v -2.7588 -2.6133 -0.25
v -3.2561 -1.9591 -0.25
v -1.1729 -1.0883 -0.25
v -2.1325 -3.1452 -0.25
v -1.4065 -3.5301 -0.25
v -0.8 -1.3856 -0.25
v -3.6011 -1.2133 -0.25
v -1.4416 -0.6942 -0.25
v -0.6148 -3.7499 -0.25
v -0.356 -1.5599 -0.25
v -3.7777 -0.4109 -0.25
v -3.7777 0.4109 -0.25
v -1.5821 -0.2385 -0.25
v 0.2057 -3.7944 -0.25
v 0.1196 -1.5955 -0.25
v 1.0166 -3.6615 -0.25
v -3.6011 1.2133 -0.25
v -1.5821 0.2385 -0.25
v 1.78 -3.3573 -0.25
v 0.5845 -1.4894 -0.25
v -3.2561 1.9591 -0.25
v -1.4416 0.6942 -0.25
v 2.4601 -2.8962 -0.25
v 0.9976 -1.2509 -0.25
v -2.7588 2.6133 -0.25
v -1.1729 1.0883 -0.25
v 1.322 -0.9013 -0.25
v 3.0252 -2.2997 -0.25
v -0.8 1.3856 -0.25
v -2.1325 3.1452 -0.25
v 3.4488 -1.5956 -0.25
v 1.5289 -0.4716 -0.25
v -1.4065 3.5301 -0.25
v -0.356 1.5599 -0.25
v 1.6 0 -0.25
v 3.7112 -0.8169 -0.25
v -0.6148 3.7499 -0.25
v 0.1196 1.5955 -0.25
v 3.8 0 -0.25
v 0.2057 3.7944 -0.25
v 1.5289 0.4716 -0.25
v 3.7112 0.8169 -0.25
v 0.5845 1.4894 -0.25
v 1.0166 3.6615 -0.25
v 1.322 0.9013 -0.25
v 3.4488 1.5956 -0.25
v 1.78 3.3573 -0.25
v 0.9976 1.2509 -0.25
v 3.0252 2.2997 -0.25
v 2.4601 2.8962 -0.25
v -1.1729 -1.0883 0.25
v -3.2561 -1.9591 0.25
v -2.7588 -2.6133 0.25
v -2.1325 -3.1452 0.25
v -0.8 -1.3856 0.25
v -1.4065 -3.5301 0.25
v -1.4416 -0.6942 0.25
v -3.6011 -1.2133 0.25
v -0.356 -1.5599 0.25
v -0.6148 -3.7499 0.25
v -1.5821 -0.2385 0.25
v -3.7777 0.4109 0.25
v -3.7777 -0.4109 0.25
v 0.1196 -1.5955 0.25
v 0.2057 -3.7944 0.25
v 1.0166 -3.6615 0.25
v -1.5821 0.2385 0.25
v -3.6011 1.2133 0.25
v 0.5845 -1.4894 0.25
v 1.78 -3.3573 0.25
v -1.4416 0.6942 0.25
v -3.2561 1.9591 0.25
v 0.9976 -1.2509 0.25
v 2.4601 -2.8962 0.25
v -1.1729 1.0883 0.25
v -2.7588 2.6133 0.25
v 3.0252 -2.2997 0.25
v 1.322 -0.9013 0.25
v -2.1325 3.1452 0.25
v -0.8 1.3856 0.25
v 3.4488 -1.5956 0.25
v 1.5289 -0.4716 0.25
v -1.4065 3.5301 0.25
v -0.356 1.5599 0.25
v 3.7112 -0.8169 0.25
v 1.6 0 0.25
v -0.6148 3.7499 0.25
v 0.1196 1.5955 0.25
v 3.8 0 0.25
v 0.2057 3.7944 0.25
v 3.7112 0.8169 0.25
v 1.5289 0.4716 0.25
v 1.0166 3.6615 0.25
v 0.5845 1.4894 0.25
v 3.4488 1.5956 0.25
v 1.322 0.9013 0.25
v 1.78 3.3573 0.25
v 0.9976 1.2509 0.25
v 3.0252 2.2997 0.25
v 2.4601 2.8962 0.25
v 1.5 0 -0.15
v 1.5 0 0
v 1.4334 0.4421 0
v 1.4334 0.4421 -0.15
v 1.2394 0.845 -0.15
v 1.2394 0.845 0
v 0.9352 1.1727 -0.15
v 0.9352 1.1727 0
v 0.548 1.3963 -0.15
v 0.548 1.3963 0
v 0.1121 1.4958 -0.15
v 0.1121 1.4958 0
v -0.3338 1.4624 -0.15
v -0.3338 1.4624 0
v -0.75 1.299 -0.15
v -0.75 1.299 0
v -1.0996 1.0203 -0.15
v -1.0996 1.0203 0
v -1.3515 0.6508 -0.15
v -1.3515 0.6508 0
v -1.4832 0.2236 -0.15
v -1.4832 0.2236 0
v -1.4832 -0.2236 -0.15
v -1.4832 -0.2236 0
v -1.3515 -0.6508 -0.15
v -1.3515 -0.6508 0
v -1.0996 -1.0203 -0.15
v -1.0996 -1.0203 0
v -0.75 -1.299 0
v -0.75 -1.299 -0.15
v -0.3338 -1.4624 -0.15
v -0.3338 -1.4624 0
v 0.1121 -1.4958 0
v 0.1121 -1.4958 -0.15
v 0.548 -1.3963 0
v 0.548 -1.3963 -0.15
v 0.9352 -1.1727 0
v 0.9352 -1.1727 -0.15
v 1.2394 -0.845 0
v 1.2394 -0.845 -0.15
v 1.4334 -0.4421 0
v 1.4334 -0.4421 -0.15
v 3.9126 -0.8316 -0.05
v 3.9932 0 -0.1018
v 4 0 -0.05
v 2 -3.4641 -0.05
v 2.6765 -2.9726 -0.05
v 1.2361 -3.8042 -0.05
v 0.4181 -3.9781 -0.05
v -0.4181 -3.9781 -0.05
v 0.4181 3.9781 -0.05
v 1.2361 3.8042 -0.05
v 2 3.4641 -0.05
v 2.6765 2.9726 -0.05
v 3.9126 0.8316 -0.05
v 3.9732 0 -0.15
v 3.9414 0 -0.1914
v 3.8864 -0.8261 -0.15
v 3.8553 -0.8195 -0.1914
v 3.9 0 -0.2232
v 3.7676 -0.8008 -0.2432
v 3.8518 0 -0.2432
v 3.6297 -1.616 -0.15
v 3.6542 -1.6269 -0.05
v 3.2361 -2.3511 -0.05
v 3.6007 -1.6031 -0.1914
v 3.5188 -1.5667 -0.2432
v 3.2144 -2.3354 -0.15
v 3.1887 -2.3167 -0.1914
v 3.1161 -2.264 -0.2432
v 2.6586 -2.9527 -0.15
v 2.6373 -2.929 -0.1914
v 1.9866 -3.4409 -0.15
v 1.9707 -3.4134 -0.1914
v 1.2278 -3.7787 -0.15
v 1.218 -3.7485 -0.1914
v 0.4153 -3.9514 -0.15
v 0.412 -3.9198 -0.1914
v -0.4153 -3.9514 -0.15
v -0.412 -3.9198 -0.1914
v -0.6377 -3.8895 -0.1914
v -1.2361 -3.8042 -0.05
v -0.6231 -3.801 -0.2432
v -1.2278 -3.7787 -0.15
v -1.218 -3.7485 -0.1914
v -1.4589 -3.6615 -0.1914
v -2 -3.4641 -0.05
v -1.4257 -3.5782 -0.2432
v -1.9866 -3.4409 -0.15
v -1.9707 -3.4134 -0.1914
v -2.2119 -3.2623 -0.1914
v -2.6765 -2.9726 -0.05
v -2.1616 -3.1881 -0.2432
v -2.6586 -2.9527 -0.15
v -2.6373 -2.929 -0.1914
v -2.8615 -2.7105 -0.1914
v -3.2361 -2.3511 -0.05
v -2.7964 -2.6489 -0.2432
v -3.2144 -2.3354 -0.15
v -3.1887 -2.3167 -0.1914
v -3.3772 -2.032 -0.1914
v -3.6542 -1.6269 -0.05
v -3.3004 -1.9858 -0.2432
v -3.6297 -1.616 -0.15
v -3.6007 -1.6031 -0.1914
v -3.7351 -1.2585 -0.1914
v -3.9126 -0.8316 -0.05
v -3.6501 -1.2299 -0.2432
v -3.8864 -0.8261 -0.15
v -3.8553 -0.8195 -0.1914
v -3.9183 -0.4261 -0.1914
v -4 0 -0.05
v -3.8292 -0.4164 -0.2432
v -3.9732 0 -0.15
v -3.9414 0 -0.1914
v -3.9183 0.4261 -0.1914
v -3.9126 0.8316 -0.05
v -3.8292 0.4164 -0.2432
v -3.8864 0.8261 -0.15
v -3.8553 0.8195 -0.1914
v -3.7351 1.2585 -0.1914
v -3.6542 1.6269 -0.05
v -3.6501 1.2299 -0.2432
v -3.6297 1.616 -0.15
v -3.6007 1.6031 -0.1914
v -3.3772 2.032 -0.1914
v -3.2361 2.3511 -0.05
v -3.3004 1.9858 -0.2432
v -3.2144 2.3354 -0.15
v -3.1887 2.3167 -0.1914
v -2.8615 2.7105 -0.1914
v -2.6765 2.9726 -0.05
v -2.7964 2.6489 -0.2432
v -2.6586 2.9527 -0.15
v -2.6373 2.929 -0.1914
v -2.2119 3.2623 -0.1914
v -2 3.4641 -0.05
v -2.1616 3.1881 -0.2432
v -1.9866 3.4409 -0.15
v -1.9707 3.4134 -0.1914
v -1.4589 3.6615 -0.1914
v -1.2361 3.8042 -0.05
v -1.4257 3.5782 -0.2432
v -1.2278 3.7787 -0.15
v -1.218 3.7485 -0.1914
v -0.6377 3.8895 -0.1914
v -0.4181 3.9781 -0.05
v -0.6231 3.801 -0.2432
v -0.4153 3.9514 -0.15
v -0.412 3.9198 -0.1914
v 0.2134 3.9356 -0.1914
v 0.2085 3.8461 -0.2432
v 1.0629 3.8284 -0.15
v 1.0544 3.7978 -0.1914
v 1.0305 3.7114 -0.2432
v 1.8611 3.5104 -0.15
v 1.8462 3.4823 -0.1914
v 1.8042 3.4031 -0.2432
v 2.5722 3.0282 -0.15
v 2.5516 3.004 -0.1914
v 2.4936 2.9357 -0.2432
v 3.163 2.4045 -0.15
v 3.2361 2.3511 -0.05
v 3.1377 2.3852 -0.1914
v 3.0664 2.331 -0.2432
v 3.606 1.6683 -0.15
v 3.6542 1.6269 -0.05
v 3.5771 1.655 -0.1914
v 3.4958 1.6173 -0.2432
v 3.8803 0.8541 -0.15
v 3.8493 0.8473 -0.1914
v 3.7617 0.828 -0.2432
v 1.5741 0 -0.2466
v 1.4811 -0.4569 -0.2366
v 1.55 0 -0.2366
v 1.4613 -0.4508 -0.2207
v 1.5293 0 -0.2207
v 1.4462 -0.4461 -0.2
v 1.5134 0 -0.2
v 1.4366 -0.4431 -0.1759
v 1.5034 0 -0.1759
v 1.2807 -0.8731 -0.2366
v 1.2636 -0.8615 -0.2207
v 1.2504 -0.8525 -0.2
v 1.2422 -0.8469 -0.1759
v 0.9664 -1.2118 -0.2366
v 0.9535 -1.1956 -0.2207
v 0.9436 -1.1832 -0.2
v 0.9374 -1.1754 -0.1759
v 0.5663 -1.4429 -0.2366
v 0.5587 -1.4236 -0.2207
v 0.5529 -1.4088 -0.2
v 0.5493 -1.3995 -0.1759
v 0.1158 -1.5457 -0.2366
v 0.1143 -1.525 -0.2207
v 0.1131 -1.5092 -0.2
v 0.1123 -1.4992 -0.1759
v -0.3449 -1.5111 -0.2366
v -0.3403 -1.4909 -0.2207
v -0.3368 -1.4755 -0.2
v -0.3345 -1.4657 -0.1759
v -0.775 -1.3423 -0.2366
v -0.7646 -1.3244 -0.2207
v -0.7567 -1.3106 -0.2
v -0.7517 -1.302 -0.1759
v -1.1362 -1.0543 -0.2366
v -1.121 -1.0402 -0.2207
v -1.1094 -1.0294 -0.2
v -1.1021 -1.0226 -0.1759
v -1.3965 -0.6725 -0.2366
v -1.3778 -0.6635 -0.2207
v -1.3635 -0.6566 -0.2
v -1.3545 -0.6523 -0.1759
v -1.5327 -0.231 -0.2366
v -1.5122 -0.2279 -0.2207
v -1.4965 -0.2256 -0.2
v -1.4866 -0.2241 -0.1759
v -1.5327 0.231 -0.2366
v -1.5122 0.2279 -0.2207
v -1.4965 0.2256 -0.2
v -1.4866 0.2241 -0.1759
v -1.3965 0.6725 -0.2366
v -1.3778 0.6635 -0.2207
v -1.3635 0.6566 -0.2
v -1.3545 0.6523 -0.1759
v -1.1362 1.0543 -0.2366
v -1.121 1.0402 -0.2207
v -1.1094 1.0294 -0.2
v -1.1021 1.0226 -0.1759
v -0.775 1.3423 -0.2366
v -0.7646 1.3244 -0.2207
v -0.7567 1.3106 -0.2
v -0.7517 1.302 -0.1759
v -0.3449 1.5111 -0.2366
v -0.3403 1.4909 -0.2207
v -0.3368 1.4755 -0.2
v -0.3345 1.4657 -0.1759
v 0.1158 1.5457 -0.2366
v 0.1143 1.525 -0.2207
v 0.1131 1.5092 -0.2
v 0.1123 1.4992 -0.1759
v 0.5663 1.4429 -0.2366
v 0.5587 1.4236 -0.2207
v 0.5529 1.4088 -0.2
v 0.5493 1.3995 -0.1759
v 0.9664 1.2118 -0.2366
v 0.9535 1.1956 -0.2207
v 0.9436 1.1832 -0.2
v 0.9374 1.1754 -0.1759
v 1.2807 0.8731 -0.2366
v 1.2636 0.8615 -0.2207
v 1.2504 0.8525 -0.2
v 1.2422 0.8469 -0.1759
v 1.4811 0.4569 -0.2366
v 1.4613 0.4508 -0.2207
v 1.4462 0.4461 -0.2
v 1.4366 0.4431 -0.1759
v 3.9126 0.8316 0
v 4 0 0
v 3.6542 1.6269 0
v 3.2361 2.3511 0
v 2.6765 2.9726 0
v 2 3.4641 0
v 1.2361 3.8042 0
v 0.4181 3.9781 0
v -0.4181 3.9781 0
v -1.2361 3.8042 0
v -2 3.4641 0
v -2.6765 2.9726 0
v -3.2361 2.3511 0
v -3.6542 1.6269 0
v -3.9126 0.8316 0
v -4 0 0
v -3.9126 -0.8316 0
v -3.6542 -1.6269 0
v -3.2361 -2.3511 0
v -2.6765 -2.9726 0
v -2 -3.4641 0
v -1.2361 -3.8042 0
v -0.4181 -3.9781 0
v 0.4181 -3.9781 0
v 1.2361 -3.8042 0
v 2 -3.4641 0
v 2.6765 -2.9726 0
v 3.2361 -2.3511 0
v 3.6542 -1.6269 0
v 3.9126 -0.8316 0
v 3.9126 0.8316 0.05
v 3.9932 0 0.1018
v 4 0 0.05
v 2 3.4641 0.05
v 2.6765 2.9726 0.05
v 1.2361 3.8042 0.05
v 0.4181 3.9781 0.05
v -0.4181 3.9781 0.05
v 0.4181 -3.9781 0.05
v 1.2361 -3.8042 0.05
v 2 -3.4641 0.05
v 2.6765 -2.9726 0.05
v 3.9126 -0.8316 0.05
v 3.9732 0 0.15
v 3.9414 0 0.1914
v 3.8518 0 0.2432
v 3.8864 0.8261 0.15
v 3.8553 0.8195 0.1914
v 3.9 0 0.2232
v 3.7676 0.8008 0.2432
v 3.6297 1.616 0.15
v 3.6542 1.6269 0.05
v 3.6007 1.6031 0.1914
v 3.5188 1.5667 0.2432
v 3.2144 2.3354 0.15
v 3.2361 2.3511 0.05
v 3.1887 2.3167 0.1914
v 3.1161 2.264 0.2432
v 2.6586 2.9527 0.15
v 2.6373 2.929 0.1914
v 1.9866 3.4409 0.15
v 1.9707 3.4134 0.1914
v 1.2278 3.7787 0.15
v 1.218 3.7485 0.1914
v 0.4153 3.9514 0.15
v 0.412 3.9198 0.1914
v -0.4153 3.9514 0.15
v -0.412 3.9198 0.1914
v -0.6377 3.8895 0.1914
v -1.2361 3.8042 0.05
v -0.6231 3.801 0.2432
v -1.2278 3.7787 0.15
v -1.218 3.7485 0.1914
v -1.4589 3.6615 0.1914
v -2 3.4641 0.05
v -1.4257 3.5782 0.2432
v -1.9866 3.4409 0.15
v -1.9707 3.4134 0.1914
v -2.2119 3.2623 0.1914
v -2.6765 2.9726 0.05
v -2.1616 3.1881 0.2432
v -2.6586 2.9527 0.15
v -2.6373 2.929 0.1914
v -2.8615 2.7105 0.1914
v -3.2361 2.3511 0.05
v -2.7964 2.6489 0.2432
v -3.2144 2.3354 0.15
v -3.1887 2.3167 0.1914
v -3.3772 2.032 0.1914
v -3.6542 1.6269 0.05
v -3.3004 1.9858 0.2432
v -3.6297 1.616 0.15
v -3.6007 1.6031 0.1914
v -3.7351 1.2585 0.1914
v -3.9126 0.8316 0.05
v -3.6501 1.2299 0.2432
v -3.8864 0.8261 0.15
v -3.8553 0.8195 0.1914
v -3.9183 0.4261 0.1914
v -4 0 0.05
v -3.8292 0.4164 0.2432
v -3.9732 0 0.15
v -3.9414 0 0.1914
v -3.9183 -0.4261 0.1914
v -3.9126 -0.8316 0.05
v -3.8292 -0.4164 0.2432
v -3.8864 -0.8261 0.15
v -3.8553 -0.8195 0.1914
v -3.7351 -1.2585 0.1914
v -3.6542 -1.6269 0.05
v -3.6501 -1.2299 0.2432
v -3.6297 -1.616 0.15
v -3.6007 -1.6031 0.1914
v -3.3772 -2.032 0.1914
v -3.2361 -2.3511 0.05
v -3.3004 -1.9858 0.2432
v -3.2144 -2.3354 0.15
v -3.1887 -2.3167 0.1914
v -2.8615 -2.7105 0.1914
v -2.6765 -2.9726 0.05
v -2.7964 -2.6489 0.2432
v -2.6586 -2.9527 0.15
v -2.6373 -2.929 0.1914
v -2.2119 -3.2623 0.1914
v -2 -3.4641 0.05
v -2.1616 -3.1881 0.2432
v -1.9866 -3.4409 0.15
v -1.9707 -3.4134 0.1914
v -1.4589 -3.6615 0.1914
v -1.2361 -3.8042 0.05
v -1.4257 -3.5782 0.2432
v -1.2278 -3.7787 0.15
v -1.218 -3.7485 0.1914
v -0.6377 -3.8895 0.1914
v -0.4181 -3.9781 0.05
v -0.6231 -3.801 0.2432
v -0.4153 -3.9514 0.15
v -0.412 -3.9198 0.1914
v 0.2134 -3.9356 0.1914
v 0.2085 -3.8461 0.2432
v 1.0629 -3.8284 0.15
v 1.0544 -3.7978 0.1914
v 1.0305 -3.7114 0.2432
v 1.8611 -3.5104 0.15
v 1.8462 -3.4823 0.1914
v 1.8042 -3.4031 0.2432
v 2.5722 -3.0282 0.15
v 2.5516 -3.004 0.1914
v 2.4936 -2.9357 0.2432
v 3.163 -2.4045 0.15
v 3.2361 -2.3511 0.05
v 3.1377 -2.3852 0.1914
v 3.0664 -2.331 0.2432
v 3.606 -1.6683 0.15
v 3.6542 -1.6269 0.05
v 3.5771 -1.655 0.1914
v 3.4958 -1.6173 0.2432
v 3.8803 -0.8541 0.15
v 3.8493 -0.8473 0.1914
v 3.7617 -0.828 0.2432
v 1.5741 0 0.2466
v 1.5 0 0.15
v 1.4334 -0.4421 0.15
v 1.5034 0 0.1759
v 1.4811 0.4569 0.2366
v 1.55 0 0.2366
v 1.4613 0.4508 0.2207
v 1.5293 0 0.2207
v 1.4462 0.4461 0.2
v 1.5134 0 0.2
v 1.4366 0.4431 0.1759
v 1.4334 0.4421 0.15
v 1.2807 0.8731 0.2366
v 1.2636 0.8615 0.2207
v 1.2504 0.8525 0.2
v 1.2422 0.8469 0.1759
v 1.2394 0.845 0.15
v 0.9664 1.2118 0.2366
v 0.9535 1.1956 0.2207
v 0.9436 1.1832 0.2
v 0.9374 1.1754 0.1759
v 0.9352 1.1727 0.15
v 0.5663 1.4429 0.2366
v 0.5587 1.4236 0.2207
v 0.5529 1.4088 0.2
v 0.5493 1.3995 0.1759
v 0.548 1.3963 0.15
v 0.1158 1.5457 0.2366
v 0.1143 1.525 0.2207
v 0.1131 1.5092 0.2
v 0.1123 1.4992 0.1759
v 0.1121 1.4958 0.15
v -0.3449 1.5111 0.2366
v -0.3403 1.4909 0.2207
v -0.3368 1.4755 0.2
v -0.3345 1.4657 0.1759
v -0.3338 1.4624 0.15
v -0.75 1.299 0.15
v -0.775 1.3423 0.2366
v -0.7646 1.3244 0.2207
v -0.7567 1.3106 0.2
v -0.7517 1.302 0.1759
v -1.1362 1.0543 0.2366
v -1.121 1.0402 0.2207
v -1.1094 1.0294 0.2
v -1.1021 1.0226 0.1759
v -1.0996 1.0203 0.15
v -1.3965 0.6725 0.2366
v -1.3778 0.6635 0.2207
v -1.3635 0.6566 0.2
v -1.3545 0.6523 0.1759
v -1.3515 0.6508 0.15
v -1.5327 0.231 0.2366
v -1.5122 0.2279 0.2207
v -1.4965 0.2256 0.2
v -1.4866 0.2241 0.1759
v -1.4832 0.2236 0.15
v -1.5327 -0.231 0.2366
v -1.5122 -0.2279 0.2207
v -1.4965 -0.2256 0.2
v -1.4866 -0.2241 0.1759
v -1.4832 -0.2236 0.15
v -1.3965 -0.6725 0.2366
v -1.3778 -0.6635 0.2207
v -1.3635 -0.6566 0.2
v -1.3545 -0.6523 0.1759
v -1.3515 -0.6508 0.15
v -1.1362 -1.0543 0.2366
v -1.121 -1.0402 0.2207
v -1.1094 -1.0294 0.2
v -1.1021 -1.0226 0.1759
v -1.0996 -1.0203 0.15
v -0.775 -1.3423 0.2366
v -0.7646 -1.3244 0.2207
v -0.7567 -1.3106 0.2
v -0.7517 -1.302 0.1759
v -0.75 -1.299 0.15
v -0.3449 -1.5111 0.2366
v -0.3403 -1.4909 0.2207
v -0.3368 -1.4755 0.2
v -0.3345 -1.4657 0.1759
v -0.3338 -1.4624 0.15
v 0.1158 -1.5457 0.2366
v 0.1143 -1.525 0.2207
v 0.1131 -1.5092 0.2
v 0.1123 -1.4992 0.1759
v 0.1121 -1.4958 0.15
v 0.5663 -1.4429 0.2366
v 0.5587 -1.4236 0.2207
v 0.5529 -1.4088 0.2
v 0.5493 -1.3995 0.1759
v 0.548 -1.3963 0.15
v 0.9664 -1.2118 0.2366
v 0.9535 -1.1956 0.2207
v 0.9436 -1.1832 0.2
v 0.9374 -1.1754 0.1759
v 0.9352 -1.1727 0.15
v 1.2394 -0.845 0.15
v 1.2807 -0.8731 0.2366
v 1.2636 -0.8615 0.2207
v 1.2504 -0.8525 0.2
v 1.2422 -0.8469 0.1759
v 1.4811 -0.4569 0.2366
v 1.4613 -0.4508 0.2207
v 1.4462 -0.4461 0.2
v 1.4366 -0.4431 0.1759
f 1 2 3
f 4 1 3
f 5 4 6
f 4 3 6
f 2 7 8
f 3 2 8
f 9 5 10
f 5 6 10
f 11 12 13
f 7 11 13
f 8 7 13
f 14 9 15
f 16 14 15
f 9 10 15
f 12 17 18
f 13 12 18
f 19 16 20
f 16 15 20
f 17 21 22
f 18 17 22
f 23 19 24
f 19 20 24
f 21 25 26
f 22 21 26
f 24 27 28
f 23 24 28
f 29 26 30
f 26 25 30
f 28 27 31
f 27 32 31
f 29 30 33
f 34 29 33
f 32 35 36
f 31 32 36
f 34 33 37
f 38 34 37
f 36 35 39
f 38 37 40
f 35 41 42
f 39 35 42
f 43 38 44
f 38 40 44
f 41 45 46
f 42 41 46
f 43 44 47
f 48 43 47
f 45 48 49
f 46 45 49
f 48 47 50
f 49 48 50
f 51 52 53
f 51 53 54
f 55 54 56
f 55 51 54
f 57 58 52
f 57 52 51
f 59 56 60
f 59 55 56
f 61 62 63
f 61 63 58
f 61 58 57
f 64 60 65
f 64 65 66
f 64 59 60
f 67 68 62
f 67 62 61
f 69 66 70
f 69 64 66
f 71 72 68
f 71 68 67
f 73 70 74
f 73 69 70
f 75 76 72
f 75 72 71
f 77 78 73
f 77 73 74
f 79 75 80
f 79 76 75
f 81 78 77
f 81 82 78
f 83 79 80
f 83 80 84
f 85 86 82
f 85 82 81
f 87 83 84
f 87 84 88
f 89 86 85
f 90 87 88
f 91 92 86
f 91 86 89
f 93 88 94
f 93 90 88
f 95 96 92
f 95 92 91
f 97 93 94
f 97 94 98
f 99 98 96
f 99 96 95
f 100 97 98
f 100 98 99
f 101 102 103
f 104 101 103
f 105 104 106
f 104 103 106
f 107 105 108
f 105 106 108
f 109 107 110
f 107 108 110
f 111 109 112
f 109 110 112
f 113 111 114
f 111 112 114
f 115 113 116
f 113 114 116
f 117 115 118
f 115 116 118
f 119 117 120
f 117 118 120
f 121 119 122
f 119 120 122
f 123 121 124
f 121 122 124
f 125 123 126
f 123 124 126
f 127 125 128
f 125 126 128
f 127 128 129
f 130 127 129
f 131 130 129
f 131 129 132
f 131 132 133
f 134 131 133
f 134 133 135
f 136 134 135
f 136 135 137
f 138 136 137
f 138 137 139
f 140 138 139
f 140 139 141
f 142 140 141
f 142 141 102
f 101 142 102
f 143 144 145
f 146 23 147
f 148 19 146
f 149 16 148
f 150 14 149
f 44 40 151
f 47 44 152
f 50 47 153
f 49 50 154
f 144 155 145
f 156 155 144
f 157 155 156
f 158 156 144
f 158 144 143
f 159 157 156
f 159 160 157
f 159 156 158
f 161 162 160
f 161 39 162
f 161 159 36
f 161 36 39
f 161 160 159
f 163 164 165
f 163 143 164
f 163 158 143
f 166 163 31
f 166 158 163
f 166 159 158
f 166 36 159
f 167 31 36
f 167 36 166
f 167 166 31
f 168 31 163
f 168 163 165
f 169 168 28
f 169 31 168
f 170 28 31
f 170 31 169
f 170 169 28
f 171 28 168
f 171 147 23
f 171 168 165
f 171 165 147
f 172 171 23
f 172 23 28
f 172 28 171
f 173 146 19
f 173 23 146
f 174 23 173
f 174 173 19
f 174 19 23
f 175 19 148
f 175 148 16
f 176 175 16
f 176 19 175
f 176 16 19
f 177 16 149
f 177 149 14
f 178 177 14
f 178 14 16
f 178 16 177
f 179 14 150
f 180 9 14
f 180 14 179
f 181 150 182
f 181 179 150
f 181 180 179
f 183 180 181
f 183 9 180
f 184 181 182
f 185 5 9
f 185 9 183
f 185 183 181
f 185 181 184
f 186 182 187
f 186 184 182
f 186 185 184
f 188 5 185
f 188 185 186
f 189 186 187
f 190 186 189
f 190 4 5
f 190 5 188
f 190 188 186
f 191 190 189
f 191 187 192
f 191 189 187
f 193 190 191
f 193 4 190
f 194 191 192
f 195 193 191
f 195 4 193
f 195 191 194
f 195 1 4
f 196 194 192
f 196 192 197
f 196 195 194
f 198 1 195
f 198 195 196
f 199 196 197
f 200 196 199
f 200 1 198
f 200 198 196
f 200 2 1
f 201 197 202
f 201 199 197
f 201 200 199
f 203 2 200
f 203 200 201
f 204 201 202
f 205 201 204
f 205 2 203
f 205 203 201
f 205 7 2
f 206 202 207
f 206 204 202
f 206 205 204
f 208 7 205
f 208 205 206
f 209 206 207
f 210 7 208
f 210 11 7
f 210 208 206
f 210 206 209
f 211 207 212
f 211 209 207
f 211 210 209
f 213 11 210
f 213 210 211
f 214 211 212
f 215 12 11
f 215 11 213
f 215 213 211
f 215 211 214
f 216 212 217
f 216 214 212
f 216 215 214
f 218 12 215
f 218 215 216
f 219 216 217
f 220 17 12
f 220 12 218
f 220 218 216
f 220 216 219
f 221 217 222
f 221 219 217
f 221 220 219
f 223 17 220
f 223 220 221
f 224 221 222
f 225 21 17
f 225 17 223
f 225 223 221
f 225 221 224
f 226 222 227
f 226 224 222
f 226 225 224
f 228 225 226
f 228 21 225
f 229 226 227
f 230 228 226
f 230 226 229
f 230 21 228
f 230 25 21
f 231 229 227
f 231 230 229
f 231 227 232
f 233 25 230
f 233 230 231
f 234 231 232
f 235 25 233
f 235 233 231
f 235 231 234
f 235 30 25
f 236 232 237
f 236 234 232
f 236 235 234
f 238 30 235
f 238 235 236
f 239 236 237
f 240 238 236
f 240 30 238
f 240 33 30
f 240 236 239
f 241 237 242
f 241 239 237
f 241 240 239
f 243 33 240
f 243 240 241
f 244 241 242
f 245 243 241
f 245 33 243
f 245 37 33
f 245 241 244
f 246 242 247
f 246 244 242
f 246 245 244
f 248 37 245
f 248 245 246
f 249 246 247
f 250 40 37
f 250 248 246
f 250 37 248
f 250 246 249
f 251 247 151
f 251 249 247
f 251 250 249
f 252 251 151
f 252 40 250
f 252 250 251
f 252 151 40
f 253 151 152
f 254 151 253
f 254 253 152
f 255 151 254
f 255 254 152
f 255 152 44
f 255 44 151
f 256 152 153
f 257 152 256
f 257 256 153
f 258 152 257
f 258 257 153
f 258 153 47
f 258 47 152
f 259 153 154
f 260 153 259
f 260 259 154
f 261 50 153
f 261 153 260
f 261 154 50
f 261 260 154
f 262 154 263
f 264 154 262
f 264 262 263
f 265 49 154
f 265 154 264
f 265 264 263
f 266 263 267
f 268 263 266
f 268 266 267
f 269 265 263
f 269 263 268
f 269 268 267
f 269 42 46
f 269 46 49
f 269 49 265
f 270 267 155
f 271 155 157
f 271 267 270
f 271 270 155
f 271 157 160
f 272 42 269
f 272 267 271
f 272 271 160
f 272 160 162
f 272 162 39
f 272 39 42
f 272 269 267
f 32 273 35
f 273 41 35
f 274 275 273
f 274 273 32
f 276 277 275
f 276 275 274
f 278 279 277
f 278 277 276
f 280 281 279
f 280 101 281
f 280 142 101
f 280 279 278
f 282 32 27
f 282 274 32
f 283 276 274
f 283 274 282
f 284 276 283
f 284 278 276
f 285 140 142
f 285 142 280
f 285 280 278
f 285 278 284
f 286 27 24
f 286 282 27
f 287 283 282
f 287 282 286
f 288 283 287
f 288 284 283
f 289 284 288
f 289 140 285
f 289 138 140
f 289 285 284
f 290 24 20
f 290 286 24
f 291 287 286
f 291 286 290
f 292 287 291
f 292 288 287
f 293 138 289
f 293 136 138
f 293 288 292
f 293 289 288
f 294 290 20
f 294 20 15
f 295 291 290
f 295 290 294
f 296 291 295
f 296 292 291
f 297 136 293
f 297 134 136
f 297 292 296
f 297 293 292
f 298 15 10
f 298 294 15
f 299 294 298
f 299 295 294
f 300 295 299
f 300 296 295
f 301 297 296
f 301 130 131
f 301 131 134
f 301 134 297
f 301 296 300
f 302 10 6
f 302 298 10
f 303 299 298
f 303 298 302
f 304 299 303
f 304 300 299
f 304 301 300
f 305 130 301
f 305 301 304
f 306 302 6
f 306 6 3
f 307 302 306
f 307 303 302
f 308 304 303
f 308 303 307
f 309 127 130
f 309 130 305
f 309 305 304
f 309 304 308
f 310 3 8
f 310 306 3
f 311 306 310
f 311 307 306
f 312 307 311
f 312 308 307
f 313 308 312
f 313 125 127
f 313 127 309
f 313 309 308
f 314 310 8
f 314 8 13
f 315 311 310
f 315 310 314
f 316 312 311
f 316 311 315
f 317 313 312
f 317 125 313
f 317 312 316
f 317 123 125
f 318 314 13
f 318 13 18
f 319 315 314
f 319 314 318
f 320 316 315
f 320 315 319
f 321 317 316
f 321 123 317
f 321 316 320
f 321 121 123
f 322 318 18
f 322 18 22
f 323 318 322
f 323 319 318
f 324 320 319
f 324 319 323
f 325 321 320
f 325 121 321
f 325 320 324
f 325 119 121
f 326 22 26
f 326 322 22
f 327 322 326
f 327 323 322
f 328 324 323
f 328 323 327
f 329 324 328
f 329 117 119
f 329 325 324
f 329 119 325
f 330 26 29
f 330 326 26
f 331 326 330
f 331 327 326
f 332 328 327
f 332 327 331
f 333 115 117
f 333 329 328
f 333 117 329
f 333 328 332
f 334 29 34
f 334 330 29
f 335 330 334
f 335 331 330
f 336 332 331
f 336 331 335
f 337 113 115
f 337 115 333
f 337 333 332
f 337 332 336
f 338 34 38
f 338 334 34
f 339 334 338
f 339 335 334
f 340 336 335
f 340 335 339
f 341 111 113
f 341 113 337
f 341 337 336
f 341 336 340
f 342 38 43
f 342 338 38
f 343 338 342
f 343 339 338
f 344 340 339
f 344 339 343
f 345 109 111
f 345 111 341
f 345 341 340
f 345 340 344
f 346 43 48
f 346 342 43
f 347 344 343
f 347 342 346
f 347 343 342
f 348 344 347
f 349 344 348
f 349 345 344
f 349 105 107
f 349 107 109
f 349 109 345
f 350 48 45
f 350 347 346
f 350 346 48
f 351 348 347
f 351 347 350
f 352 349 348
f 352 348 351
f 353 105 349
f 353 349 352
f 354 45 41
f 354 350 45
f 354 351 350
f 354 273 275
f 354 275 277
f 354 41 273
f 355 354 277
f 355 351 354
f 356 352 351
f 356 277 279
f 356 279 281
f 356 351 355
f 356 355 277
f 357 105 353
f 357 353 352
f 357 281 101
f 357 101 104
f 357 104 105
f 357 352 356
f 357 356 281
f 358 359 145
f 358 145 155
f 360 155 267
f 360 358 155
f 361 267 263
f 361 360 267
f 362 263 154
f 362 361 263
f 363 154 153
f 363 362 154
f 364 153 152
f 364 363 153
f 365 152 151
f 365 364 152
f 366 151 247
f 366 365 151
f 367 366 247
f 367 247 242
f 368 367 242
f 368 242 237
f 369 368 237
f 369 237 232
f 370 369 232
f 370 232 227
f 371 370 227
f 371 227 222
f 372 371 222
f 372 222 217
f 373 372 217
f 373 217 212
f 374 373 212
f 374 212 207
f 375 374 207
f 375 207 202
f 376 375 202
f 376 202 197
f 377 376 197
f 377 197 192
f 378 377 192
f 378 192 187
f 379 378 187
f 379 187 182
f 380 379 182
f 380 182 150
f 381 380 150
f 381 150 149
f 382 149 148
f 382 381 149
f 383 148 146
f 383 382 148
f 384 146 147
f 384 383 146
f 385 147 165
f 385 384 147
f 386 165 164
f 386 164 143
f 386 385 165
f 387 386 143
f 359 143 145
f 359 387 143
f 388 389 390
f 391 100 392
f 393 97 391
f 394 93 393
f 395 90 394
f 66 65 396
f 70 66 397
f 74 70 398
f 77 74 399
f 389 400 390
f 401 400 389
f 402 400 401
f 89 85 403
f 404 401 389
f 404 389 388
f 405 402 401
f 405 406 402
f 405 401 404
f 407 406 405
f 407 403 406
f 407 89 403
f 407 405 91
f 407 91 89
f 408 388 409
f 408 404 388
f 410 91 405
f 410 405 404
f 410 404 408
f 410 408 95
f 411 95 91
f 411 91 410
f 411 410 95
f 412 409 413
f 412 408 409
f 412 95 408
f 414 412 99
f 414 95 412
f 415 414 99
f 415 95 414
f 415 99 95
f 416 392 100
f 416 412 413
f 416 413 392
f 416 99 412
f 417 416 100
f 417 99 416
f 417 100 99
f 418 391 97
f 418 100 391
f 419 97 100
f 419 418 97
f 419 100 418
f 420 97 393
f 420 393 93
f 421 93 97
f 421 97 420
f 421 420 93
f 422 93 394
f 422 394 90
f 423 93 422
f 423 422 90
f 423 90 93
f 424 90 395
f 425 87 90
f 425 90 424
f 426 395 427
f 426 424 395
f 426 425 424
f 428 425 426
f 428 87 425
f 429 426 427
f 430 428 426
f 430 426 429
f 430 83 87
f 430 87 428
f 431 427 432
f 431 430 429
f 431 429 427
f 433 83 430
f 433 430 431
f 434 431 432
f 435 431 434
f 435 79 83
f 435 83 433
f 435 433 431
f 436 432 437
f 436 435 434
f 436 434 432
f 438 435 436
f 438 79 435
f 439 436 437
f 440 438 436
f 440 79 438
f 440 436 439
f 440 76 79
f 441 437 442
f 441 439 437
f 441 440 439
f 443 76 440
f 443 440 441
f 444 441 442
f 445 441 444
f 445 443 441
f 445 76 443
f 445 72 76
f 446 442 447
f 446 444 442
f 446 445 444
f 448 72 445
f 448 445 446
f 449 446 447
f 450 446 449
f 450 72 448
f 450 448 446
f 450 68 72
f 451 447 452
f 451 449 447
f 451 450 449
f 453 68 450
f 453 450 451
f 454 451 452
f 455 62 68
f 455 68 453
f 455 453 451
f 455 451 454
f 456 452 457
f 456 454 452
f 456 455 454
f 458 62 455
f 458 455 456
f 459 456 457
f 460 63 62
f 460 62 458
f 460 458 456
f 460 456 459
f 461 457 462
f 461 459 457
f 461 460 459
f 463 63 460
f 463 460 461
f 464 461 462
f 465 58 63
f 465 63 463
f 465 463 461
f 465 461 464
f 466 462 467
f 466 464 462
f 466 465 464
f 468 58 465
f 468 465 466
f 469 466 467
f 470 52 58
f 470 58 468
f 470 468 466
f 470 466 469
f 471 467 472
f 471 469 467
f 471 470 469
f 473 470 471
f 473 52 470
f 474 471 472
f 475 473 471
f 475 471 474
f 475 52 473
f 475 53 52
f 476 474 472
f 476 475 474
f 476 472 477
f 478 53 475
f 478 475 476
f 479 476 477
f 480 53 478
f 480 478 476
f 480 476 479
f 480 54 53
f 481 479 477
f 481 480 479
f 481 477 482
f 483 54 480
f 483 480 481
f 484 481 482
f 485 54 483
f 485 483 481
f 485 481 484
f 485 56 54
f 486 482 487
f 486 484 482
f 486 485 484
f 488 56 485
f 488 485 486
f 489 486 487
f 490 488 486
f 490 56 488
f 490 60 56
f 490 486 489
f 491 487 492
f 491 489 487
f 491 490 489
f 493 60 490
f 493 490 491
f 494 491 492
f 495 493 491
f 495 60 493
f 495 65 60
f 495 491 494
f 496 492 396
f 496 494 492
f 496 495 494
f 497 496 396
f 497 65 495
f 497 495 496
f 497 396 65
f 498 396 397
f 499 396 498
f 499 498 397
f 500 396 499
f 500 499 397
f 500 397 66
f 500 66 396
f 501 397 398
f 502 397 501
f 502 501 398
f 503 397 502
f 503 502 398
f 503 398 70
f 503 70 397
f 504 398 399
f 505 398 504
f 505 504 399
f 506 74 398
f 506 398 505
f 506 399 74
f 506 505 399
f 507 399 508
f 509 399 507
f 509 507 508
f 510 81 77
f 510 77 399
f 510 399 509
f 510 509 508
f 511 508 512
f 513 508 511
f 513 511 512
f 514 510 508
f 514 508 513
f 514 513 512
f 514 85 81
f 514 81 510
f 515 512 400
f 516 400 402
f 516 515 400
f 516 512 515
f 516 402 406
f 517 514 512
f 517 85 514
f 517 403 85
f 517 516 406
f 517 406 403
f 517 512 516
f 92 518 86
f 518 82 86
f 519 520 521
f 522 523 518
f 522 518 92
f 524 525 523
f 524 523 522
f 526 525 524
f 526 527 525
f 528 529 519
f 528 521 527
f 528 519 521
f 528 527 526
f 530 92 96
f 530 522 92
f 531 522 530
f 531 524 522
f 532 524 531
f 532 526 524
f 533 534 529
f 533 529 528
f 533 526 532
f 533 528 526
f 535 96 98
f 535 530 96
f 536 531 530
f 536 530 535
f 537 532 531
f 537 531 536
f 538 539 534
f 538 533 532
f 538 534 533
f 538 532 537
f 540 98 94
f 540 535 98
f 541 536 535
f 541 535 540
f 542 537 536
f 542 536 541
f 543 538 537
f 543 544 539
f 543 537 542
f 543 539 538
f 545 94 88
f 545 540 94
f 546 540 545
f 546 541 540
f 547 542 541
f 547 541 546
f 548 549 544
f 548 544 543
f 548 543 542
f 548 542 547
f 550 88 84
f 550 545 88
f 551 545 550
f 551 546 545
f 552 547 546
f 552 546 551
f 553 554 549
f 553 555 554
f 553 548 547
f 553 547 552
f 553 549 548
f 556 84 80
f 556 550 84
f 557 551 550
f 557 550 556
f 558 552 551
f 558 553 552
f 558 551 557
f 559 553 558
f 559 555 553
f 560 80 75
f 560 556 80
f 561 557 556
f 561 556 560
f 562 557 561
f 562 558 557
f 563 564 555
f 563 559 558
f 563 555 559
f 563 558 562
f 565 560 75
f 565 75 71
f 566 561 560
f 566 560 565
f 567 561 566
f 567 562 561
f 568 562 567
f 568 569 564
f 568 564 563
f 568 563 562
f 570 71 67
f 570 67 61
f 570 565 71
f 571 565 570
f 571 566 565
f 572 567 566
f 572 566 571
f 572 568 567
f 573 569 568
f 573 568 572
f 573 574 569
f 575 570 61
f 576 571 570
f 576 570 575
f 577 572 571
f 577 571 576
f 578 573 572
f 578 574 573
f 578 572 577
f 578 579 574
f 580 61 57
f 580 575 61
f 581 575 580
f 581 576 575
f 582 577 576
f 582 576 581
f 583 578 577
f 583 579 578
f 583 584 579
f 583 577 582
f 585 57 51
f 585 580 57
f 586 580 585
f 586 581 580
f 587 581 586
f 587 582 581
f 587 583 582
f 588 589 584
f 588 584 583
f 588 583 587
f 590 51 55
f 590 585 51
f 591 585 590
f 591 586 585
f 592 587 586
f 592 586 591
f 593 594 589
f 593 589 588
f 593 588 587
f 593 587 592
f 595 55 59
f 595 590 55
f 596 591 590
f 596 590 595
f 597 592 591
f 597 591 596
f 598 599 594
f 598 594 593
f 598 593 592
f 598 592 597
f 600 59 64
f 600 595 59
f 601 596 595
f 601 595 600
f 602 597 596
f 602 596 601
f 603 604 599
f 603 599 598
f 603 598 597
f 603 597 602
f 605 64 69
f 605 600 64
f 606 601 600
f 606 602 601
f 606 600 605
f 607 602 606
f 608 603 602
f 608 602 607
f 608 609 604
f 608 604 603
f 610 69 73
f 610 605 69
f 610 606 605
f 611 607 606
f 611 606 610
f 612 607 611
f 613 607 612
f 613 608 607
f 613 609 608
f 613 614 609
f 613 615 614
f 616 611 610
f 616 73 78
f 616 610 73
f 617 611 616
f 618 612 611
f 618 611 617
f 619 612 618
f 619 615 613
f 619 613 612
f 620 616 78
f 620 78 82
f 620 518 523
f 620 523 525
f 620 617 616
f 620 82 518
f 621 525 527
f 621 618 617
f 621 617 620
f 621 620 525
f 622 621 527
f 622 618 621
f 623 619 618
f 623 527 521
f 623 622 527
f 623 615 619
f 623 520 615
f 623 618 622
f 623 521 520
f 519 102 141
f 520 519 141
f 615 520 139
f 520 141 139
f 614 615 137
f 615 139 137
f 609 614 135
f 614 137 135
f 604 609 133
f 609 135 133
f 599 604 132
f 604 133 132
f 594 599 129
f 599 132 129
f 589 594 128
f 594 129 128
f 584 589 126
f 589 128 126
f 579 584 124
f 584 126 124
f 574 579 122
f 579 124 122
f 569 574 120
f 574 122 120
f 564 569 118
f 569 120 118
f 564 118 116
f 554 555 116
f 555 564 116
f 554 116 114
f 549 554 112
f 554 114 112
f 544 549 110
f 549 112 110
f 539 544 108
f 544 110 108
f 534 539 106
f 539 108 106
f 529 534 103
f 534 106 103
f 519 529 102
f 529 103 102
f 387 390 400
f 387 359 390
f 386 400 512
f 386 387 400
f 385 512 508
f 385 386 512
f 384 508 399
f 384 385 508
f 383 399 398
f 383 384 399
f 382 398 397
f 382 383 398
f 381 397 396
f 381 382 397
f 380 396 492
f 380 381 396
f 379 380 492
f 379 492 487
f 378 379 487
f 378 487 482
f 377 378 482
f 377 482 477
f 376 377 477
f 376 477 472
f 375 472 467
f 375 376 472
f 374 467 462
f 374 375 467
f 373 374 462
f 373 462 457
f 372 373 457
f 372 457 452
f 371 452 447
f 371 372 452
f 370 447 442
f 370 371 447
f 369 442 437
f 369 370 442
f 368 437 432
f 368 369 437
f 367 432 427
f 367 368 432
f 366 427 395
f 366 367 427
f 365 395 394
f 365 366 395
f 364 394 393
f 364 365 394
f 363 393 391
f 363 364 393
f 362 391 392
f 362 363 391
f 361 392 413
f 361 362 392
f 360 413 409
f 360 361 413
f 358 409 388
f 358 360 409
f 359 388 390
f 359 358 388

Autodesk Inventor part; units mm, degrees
ref_plane "YZ Plane" through (0, 0, 0) normal (1, 0, 0) x (0, 1, 0)
ref_plane "XZ Plane" through (0, 0, 0) normal (0, 1, 0) x (-1, 0, 0)
ref_plane "XY Plane" through (0, 0, 0) normal (0, 0, 1) x (1, 0, 0)
sketch "Sketch1" plane through (0, 0, 0) normal (0, 0, 1) x (1, 0, 0)
  circle A0 centre (0, 0) radius 1.5
  circle A1 centre (0, 0) radius 4
  dimension "Di" = 3
  dimension "D" = 8
extrude "Extrusion1" add sketch "Sketch1" along normal mid plane 0.5
fillet "Fillet1" radius 0.2 2 edges at (-4, 0, 0.25) (-4, 0, -0.25)
fillet "Fillet2" radius 0.1 2 edges at (-1.5, 0, 0.25) (-1.5, 0, -0.25)
properties part number "Anilha_M3" material "Stainless Steel"
